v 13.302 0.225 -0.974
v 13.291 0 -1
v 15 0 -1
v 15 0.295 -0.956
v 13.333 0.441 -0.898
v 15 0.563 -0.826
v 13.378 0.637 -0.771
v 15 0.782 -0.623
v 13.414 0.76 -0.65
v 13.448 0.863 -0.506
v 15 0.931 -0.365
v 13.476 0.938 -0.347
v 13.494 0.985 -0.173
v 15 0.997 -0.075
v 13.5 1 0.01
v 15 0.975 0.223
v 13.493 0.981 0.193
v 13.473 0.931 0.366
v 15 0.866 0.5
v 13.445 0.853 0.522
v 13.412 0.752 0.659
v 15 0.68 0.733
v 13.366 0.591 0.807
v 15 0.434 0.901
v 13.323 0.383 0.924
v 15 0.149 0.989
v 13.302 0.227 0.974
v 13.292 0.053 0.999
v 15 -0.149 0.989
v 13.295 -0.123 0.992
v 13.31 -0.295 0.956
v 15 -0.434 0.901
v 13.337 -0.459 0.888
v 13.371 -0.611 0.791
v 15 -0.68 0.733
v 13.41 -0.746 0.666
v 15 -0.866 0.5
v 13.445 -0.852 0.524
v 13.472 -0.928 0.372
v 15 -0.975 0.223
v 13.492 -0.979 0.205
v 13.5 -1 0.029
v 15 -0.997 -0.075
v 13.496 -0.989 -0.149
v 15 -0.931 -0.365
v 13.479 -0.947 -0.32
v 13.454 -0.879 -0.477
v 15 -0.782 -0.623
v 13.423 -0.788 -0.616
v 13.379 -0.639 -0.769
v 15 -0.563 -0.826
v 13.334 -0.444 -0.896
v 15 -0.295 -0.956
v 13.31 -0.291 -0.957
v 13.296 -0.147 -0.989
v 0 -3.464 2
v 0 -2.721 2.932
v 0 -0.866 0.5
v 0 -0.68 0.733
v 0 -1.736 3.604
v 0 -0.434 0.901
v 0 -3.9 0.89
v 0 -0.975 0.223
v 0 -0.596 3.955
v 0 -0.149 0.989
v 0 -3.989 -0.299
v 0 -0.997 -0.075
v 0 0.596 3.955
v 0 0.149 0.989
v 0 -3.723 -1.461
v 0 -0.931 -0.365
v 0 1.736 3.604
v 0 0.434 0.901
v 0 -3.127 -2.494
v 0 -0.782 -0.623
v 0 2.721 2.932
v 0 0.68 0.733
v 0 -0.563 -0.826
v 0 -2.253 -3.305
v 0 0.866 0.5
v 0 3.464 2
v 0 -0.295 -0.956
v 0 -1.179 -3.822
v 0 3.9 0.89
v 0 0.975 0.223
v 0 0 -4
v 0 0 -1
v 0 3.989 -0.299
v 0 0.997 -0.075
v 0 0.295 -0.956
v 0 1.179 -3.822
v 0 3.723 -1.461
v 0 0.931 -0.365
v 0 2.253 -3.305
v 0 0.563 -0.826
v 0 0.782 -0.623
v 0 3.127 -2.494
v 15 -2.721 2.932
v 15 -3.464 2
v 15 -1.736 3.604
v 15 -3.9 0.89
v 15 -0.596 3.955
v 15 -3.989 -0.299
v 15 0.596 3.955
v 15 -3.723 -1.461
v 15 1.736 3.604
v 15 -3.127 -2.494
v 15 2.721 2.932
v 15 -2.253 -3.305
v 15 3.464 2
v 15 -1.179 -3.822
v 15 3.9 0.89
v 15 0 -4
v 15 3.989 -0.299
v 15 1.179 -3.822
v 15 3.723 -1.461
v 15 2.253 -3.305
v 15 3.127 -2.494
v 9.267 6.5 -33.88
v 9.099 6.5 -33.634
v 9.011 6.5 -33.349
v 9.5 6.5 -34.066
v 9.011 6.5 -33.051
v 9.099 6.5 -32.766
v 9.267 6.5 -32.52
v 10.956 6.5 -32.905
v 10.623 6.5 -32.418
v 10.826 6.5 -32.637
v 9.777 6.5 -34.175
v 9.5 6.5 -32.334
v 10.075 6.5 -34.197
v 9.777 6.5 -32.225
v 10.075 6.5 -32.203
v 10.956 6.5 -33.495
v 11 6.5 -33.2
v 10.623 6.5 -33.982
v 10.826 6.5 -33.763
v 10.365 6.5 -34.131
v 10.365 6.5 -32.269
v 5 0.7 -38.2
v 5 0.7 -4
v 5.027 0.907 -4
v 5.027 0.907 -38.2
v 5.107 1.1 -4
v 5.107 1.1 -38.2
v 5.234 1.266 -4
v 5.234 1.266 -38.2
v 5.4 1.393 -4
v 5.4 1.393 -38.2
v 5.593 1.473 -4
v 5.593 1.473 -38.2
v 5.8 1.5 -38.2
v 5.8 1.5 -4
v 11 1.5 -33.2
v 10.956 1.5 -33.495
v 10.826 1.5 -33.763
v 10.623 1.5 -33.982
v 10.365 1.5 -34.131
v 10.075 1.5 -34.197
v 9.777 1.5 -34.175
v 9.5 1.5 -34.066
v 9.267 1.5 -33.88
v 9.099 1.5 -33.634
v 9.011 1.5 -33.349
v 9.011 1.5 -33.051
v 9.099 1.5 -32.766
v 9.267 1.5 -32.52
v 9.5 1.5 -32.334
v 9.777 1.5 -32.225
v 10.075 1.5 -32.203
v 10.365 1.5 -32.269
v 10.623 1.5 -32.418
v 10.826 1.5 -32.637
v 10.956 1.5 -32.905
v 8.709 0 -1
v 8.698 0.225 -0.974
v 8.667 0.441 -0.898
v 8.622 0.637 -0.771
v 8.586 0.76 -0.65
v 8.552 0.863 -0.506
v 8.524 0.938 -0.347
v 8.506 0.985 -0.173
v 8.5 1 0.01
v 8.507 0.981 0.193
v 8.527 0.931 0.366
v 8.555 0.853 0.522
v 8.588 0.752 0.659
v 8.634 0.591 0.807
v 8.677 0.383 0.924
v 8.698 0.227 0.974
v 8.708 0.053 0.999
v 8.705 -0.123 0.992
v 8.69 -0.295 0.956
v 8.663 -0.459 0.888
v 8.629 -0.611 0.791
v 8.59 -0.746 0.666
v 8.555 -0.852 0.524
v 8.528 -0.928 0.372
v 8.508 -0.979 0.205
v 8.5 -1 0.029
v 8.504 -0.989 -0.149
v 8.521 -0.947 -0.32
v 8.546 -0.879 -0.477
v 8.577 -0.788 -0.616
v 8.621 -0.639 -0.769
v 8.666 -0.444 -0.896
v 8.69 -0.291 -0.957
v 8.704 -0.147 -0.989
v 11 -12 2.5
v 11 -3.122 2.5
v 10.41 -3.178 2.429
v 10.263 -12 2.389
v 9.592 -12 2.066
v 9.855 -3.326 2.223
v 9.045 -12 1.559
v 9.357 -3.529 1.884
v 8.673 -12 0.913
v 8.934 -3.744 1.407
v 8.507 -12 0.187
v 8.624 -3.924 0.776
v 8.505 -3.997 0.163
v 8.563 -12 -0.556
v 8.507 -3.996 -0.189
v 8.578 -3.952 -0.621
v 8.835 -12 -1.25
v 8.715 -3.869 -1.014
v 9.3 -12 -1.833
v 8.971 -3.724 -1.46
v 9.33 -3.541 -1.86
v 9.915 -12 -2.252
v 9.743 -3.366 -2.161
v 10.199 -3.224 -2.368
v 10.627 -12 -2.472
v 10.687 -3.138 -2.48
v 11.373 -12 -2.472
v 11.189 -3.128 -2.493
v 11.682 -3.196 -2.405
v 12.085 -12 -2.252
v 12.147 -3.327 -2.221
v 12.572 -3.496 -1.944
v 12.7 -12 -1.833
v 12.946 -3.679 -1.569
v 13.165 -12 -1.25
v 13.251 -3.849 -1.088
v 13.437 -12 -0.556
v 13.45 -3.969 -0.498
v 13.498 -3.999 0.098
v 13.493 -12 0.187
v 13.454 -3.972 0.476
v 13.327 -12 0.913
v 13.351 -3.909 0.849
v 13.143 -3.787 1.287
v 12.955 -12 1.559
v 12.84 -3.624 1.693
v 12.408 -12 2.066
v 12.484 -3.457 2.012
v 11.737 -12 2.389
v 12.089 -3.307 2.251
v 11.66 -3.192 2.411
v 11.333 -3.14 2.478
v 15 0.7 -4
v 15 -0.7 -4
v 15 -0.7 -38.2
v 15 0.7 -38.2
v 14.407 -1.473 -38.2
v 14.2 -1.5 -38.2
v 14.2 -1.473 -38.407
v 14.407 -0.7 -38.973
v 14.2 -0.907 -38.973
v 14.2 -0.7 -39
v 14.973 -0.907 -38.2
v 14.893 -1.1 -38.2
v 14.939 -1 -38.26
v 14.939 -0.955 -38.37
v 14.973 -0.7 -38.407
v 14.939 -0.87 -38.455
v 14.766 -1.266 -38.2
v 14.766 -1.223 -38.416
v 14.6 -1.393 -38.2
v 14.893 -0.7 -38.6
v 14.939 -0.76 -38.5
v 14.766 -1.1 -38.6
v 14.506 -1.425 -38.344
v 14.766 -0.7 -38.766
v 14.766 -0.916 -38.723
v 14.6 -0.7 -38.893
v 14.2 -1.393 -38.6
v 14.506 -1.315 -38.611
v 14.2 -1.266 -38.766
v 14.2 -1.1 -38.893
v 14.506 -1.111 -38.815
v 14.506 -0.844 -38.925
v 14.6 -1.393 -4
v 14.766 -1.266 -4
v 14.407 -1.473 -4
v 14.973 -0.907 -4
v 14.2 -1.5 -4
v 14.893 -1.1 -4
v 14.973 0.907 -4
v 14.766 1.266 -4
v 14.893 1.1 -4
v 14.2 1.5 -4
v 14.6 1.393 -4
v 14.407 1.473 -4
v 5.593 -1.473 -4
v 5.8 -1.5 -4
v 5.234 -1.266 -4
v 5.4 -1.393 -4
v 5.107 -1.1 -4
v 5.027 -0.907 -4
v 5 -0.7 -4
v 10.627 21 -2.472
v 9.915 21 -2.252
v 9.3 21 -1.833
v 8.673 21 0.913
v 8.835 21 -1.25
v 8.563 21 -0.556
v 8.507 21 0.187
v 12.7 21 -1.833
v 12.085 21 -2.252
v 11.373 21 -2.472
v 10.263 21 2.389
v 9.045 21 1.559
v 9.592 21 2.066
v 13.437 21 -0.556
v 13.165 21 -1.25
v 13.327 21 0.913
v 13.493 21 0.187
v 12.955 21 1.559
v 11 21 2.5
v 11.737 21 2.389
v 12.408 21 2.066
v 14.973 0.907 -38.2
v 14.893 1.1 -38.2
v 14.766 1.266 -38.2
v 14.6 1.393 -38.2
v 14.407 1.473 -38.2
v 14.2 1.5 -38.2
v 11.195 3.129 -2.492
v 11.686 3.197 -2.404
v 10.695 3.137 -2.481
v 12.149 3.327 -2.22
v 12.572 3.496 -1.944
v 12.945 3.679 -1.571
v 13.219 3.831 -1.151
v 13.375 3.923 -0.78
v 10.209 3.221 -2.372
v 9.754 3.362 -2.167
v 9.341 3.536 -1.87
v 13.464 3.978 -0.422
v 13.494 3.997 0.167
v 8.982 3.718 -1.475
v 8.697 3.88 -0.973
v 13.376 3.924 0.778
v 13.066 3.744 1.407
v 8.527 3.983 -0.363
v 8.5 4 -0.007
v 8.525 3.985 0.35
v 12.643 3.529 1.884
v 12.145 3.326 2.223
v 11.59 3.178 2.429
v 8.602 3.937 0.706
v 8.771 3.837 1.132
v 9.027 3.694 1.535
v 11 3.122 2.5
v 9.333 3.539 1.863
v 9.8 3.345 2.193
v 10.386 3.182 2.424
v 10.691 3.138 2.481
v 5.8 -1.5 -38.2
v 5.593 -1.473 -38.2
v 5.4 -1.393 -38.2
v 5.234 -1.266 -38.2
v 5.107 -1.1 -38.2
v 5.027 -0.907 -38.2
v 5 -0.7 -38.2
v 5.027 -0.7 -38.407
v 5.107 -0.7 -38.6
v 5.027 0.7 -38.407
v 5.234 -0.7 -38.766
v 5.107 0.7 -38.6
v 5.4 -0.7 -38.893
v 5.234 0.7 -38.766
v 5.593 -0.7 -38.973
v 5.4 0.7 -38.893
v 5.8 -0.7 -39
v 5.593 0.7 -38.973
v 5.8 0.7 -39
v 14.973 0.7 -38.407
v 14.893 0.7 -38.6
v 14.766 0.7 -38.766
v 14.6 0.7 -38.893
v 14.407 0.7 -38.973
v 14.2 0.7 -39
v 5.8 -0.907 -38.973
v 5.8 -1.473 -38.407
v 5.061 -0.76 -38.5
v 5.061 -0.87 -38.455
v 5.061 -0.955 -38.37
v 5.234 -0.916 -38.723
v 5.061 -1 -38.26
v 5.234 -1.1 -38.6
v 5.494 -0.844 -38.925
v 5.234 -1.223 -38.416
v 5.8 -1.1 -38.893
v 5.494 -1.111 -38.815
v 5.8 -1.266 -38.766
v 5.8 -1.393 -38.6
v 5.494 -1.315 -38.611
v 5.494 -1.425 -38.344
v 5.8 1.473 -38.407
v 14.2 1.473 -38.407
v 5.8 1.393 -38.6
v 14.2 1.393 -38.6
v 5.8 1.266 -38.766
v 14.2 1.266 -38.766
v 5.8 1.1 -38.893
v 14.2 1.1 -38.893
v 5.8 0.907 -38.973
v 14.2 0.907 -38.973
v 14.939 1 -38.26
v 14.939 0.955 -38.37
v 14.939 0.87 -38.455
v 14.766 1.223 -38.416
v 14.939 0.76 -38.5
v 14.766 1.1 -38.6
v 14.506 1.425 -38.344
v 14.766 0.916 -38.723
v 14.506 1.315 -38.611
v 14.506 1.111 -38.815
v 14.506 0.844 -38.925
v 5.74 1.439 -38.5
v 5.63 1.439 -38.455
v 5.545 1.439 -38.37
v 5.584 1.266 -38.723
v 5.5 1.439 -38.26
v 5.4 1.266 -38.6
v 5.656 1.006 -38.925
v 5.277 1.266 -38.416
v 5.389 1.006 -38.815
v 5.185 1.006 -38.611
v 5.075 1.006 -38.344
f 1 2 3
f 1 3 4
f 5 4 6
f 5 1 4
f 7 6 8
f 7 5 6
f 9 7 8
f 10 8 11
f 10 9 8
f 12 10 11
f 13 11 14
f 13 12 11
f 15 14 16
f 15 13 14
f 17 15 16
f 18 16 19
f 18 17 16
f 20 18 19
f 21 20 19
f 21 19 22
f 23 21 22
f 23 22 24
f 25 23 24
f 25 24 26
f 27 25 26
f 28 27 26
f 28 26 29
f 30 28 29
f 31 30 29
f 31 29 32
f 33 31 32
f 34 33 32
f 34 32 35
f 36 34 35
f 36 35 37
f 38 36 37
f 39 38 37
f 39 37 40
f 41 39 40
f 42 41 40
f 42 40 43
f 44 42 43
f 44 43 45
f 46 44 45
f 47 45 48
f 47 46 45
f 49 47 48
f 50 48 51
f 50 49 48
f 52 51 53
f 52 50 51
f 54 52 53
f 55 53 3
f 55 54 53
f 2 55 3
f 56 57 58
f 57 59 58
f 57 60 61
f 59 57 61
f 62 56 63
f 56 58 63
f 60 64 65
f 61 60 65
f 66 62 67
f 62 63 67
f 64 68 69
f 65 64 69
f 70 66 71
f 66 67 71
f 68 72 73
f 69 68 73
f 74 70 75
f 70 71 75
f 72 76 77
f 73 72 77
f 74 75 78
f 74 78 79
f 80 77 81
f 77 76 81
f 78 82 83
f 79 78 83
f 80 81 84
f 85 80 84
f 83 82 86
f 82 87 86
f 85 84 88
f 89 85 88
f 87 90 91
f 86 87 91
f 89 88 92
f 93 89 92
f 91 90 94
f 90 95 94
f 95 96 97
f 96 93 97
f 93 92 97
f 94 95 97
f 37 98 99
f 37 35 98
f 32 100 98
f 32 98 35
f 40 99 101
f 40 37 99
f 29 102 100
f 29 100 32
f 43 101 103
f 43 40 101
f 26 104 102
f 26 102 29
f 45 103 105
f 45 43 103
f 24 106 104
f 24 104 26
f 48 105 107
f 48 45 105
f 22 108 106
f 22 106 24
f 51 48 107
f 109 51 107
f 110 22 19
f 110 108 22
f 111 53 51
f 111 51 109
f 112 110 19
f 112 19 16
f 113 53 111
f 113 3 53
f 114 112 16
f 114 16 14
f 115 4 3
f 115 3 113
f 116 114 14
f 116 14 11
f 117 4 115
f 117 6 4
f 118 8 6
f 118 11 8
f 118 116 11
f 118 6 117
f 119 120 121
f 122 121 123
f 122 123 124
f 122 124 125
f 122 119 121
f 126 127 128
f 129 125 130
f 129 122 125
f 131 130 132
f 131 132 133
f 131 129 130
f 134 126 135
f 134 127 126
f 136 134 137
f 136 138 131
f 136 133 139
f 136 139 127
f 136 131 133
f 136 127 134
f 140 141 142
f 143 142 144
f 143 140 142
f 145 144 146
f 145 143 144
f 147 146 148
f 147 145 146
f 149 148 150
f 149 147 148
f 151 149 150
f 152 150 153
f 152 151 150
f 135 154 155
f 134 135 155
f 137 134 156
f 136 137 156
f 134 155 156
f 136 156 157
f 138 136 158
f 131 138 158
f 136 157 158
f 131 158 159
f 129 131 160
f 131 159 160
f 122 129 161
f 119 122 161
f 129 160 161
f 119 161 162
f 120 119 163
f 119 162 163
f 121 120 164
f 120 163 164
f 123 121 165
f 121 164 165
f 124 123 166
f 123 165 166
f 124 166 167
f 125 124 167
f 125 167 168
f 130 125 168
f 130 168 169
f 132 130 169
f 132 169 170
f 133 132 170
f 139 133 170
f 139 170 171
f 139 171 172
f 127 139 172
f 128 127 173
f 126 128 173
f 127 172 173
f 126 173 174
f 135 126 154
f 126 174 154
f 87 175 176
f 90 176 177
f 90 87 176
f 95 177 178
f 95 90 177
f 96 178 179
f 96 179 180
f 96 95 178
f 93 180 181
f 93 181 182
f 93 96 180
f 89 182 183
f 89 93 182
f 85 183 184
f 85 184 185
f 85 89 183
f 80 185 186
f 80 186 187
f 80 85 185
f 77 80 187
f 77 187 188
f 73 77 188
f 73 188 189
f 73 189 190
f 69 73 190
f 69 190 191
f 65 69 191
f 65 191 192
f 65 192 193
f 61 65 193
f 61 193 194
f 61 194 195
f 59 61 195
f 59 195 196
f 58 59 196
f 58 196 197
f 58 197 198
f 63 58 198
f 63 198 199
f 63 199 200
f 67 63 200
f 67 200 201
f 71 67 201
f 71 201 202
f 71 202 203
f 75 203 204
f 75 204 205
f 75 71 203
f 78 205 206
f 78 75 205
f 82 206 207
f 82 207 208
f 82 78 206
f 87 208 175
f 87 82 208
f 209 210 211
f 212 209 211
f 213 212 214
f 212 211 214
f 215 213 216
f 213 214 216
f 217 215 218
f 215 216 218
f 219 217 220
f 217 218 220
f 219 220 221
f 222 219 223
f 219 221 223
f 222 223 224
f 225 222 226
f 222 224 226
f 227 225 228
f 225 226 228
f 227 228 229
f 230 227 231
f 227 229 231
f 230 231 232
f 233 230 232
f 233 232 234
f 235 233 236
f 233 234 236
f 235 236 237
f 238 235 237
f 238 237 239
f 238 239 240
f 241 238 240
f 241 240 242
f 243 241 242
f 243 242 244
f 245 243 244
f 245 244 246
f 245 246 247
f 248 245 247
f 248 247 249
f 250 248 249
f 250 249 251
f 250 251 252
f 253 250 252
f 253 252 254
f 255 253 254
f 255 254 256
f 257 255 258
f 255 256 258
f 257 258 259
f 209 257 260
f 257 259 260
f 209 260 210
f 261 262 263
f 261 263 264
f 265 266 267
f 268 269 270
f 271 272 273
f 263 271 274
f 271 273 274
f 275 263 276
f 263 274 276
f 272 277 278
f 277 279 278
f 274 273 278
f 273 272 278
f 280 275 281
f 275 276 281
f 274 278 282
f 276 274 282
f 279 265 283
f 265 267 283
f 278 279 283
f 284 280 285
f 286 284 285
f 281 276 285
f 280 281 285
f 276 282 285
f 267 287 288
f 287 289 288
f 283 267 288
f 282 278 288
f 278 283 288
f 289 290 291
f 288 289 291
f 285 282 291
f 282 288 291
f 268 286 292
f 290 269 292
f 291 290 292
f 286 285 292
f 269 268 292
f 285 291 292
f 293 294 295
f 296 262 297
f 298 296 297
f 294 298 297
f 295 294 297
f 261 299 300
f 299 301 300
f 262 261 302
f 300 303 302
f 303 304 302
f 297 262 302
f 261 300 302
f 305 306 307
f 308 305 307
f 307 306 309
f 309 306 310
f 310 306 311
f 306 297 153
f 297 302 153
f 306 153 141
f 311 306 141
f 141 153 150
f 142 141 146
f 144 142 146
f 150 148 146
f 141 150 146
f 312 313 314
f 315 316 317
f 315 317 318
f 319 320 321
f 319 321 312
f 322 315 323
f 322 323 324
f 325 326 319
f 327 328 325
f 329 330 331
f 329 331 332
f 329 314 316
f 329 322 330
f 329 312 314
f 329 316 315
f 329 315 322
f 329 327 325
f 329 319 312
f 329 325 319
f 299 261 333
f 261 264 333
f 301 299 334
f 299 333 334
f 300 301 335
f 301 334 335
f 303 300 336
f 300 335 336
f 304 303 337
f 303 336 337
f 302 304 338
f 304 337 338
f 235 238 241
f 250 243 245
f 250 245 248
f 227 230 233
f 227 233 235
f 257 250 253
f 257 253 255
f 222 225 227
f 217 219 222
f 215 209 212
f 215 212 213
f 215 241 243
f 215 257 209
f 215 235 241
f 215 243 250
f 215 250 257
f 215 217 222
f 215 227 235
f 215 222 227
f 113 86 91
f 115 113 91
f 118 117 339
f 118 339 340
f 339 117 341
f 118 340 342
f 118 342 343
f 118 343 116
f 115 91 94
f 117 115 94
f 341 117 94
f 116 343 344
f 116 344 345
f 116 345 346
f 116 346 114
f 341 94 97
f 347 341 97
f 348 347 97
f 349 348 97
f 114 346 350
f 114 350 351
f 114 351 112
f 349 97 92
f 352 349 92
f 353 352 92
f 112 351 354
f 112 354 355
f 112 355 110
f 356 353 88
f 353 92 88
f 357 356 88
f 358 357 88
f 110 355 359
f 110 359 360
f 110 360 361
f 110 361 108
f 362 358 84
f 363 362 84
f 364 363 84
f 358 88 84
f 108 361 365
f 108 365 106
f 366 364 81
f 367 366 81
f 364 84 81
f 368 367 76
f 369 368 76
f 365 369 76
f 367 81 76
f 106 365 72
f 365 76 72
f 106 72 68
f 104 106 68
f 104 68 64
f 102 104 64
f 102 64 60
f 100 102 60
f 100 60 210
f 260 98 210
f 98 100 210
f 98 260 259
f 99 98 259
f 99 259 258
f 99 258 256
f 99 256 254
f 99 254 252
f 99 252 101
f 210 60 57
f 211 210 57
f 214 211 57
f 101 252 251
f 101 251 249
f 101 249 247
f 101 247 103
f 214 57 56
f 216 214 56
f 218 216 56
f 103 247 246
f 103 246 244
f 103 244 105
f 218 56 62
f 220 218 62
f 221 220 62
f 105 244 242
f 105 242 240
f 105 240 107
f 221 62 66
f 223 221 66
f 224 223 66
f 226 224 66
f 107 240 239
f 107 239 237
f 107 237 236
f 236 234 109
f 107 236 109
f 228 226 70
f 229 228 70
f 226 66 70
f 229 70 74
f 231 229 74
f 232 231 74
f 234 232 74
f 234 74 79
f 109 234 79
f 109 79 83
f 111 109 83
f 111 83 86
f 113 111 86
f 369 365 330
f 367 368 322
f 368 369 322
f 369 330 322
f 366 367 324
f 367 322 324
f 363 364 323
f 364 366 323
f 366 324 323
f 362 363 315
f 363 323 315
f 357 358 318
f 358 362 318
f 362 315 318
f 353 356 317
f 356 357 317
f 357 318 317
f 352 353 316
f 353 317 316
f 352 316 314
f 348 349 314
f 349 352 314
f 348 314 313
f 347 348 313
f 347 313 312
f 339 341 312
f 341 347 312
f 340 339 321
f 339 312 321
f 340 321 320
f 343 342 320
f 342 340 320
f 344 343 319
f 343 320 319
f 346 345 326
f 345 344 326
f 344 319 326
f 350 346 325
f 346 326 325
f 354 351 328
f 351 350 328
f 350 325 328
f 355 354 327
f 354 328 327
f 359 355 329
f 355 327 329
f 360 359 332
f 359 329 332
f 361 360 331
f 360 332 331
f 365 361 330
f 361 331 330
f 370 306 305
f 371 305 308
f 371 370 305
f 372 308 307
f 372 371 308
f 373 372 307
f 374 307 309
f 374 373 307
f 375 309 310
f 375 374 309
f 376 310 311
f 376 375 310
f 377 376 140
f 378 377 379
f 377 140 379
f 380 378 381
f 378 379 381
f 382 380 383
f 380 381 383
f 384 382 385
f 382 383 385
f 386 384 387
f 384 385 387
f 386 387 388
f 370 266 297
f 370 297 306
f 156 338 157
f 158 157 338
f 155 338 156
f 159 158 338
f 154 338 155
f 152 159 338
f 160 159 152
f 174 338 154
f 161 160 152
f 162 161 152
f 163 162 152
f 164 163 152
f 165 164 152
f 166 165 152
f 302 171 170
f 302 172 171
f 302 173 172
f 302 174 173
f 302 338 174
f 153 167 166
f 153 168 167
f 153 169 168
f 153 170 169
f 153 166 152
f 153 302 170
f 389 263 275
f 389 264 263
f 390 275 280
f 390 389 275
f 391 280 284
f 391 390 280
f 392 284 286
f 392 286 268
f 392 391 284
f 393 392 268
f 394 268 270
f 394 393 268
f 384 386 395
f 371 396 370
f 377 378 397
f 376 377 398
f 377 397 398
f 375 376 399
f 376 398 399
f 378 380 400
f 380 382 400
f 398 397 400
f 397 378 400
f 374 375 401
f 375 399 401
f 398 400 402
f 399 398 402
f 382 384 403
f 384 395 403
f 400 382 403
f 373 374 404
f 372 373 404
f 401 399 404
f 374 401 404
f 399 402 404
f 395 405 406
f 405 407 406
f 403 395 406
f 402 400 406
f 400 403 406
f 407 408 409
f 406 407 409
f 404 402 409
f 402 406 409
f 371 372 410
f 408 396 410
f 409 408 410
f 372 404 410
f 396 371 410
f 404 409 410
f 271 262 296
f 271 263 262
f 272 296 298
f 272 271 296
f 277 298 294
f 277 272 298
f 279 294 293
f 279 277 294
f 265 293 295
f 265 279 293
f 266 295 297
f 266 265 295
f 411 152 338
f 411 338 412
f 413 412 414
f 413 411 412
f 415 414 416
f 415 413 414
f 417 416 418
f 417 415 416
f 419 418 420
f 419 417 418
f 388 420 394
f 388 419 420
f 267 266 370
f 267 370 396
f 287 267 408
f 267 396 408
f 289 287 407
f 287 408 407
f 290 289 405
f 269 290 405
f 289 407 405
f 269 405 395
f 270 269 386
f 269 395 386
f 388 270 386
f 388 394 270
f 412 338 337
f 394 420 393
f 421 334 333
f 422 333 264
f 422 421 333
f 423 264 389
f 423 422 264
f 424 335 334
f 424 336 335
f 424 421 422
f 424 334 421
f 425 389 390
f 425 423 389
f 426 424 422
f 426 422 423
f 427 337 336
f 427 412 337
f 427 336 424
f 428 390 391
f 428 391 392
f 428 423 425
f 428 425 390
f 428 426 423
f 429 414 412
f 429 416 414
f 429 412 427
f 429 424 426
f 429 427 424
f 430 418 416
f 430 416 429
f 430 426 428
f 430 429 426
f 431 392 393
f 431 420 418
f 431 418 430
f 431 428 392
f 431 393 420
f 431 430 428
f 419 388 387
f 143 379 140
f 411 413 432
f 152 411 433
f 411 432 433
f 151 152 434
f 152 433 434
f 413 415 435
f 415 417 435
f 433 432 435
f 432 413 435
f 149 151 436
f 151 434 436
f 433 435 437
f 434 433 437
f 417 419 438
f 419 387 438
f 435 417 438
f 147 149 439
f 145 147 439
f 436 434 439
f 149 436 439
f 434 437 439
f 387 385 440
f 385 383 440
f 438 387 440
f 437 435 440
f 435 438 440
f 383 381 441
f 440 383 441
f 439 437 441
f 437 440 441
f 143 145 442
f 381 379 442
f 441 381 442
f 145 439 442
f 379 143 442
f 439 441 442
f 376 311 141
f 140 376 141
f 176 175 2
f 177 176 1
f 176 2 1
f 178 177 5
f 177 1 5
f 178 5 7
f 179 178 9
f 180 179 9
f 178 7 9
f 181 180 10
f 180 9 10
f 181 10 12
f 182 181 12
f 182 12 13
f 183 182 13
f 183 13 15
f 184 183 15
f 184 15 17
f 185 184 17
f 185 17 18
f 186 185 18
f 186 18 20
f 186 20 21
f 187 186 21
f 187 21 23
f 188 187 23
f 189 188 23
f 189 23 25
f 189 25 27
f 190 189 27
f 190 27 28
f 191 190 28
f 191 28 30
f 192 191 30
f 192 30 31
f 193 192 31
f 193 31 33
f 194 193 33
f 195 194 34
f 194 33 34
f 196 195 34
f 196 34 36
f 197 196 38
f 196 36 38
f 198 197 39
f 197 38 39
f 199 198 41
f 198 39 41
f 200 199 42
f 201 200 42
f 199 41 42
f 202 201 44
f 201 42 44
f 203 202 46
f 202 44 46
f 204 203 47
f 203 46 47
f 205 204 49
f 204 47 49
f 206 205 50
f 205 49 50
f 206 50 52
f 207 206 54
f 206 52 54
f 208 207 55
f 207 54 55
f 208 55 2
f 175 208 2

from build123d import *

# Parameters (mm, degrees)
SKETCH2_R           = 4
SKETCH2_R_2         = 1
BOSS_EXTRUDE1_DEPTH = 15
SKETCH4_R           = 2.5
BOSS_EXTRUDE2_DEPTH = 17
SKETCH6_R           = 2.5
BOSS_EXTRUDE3_DEPTH = 16
SKETCH8_R           = 1
CUT_EXTRUDE1_DEPTH  = 27.115129868
SKETCH12_W          = 10
SKETCH12_H          = 3
BOSS_EXTRUDE6_DEPTH = 35
FILLET2_R           = 0.8
SKETCH13_R          = 1
BOSS_EXTRUDE7_DEPTH = 5


with BuildPart() as part:
    # Sketch2 → Boss-Extrude1 (new body)
    with BuildSketch(Plane(origin=(0, 0, 0), x_dir=(0, 0, -1), z_dir=(1, 0, 0))):
        Circle(SKETCH2_R)
        Circle(SKETCH2_R_2, mode=Mode.SUBTRACT)
    extrude(amount=BOSS_EXTRUDE1_DEPTH)



with BuildPart() as body_2:
    # Sketch4 → Boss-Extrude2 (new body)
    with BuildSketch(Plane(origin=(15, 4, 0), x_dir=(1, 0, 0), z_dir=(0, 1, 0))):
        with Locations(Location((-4, 0, 0), (0, 0, 270))):
            Circle(SKETCH4_R)
    extrude(amount=BOSS_EXTRUDE2_DEPTH)


with BuildPart() as part_1:
    add(part.part)

    add(body_2.part)  # Boss-Extrude3 merges body 2
    # Sketch6 → Boss-Extrude3 (add)
    with BuildSketch(Plane.XZ.offset(-4)):
        with Locations(Location((11, 0, 0), (0, 0, 90))):
            Circle(SKETCH6_R)
    extrude(amount=BOSS_EXTRUDE3_DEPTH)

    # Sketch8 → Cut-Extrude1 (cut, through all)
    with BuildSketch(Plane(origin=(15, 0, 0), x_dir=(0, 0, -1), z_dir=(1, 0, 0))):
        Circle(SKETCH8_R)
    extrude(amount=-CUT_EXTRUDE1_DEPTH, mode=Mode.SUBTRACT)


with BuildPart() as body_2_2:
    # Sketch12 → Boss-Extrude6 (new body)
    with BuildSketch(Plane(origin=(15, 0, -4), x_dir=(-1, 0, 0), z_dir=(0, 0, -1))):
        with Locations((5, 0)):
            Rectangle(SKETCH12_W, SKETCH12_H)
    extrude(amount=BOSS_EXTRUDE6_DEPTH)

    # Fillet2
    fillet2_edges = [body_2_2.edges().sort_by_distance(p)[0] for p in [
        (10, -1.5, -39),
        (5, 0, -39),
        (10, 1.5, -39),
        (5, 1.5, -21.5),
        (5, -1.5, -21.5),
        (15, -1.5, -21.5),
        (15, 1.5, -21.5),
        (15, 0, -39),
    ]]
    fillet(fillet2_edges, radius=FILLET2_R)

    # Sketch13 → Boss-Extrude7 (add)
    with BuildSketch(Plane(origin=(0, 1.5, 0), x_dir=(1, 0, 0), z_dir=(0, 1, 0))):
        with Locations((10, 33.2)):
            Circle(SKETCH13_R)
    extrude(amount=BOSS_EXTRUDE7_DEPTH)


solid = Compound([part_1.part, body_2_2.part])
